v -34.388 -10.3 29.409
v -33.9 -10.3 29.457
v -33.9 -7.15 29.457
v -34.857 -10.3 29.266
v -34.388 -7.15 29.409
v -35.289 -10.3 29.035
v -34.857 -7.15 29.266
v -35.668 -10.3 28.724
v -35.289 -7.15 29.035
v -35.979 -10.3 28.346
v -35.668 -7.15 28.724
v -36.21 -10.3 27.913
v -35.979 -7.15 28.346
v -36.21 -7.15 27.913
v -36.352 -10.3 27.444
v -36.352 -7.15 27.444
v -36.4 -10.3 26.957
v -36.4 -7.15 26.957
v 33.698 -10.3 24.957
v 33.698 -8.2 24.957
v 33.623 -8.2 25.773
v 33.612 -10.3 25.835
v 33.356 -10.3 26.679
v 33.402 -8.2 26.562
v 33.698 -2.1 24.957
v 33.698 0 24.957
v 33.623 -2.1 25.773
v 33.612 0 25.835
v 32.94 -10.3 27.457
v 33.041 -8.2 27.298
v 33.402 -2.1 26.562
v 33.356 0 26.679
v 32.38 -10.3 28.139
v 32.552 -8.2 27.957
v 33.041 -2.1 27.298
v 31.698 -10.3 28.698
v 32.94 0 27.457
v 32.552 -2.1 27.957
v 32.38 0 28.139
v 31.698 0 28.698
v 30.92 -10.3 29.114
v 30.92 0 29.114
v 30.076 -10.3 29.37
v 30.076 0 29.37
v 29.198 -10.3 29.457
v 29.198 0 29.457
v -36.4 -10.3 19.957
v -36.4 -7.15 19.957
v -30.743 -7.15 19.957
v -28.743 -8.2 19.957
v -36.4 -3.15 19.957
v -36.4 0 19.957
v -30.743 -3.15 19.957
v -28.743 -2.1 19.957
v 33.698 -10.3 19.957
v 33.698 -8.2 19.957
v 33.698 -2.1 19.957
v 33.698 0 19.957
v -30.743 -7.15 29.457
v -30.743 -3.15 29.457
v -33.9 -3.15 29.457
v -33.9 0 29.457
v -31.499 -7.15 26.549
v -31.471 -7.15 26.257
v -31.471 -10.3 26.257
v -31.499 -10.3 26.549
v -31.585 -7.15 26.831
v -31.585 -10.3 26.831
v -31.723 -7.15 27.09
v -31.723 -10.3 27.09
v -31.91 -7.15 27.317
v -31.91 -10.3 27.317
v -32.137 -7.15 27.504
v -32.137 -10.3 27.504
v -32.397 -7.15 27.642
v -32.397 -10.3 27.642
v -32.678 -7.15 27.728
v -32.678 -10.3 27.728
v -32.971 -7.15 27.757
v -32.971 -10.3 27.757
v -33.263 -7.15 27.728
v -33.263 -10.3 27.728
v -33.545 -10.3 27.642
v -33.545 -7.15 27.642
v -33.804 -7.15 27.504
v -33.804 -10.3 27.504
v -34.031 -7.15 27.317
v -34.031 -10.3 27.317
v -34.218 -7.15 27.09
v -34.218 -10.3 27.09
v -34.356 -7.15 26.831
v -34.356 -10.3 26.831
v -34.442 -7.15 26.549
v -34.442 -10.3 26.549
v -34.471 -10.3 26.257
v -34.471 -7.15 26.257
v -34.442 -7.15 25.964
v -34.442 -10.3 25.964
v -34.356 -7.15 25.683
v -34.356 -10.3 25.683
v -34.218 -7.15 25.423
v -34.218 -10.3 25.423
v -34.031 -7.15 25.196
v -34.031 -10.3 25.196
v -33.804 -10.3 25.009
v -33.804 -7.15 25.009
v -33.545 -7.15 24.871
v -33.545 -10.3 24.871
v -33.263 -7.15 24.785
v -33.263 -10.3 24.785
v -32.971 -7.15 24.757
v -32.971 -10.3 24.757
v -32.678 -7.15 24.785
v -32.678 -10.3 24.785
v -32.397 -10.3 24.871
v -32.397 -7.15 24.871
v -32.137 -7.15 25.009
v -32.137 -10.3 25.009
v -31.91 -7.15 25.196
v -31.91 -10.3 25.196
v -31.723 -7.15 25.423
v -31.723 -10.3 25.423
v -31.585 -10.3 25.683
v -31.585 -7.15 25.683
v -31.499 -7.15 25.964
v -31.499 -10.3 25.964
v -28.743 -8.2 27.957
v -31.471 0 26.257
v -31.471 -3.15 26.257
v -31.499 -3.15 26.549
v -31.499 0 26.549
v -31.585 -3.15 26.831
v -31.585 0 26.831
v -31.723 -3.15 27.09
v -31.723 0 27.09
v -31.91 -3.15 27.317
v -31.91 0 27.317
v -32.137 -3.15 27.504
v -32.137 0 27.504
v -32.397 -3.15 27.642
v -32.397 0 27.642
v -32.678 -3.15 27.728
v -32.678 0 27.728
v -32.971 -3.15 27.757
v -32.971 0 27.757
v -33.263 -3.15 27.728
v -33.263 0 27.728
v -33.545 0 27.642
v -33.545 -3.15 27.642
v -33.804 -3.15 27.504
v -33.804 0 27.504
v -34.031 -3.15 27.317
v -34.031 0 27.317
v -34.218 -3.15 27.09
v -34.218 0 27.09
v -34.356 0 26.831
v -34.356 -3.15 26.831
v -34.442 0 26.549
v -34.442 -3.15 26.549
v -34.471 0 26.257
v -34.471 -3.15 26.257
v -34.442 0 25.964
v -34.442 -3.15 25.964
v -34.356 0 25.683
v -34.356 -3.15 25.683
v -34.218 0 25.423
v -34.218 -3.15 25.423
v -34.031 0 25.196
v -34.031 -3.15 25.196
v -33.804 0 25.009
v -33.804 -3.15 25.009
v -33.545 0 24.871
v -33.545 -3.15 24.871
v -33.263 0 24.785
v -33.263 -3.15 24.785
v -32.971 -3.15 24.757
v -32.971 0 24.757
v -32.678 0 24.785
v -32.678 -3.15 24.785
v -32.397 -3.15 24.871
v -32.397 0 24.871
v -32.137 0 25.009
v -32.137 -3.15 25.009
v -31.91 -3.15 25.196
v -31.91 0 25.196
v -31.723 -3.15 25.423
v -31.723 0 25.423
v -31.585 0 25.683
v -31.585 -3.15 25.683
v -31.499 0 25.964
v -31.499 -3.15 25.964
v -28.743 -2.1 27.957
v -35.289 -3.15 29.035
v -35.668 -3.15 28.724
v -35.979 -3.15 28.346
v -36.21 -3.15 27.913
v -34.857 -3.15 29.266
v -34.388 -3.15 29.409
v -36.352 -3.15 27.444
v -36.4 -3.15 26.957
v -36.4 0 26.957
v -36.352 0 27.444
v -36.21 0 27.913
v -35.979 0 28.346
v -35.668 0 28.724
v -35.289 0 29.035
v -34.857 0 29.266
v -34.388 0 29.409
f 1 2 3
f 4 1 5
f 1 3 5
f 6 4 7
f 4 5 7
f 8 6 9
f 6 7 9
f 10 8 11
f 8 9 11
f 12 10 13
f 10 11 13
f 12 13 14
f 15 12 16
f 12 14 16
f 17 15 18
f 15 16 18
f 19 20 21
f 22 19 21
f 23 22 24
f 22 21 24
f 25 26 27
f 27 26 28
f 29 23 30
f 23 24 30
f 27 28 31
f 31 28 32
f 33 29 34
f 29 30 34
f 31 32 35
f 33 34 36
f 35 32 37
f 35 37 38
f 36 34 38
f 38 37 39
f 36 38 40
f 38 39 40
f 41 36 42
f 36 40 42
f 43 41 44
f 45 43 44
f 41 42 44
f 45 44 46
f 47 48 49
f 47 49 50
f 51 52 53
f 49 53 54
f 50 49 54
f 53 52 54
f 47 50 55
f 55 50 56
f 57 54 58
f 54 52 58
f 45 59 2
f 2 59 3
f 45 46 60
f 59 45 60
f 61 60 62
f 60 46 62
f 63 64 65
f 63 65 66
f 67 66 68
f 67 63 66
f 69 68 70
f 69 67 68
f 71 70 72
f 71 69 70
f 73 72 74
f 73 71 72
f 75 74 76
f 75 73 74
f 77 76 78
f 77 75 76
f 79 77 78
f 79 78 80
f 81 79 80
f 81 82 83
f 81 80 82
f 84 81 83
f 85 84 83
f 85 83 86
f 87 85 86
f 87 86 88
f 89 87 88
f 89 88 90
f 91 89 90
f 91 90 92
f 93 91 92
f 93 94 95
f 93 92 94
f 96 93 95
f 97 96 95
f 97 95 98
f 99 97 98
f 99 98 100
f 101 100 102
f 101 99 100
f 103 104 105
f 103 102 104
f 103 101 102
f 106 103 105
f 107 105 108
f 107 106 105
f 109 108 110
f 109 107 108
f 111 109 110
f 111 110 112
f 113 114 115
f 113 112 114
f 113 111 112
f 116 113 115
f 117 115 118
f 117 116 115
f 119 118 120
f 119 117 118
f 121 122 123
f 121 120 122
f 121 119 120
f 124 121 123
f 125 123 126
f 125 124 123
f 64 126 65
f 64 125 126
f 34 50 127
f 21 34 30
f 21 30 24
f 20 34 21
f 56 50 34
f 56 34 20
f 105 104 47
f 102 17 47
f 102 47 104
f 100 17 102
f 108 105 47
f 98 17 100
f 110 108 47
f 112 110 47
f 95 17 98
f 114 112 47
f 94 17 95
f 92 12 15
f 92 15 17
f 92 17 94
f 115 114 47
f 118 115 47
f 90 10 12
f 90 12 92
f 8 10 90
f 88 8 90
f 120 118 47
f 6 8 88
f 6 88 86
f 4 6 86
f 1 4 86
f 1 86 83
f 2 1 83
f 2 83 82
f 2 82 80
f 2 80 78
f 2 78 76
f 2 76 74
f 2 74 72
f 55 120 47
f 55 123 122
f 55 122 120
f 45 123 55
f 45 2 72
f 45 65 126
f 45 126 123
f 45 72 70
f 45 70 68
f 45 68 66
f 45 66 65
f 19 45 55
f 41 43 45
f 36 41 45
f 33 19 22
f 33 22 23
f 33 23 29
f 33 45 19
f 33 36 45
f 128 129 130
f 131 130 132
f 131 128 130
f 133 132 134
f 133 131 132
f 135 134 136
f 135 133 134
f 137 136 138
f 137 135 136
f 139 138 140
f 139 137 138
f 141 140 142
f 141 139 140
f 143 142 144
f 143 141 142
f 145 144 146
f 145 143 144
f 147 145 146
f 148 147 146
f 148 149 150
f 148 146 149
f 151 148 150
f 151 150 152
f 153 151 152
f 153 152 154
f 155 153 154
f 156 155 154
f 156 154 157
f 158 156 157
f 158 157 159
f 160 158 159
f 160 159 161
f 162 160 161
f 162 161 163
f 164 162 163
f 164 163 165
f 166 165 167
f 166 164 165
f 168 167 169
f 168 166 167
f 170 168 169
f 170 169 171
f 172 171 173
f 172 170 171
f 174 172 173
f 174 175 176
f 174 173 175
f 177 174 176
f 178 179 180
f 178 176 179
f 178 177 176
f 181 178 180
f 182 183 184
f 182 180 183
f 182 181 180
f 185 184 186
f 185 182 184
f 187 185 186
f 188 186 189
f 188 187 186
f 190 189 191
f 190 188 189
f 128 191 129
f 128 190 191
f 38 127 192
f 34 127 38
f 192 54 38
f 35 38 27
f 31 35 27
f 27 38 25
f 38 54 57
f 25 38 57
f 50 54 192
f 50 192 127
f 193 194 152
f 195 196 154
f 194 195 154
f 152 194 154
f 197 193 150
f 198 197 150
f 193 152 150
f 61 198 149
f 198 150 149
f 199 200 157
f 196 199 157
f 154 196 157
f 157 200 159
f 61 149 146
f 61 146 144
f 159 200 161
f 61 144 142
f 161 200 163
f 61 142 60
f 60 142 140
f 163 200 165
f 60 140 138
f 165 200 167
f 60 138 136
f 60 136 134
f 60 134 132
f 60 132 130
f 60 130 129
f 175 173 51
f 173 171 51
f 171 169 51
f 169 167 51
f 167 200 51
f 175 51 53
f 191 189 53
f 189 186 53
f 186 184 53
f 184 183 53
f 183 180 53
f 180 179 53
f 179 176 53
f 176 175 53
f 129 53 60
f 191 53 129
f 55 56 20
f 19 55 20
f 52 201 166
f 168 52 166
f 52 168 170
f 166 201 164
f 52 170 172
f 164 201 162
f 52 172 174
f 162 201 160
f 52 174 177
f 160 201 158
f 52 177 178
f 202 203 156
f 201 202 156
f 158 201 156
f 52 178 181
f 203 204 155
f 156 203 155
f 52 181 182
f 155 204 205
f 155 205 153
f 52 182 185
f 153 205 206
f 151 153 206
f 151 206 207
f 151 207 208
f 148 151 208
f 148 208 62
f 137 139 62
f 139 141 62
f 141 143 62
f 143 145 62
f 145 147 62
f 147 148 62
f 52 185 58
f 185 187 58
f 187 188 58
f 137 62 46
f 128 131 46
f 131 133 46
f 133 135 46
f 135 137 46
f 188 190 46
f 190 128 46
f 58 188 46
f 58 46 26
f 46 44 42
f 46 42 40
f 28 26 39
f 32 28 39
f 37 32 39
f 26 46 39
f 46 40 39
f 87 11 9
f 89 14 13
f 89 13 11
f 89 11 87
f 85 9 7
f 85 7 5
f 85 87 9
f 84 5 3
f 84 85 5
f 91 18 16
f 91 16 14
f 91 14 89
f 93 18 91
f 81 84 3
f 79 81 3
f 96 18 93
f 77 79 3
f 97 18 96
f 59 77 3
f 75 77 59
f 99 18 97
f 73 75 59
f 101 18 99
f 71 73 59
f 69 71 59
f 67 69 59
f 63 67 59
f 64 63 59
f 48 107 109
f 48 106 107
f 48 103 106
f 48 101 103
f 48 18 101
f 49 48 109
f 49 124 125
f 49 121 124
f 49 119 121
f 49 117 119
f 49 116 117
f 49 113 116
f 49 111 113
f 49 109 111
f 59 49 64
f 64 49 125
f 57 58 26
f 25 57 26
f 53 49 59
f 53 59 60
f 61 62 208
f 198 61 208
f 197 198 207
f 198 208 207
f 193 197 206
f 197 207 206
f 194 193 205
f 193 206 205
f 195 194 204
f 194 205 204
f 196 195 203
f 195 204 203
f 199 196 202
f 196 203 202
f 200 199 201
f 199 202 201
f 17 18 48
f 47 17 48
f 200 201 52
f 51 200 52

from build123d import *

# Parameters (mm, degrees)
F1_DEPTH = 10.3
F2_W     = 6.2
F2_H     = 4
F3_DEPTH = 29.457661
F4_R     = 1.5
F5_DEPTH = 10.301
F6_W     = 62.441146
F6_H     = 6.1
F7_DEPTH = 8


with BuildPart() as f1:
    # F0 (on Front) → F1 (new body)
    with BuildSketch(Plane.XZ):
        with BuildLine():
            Line((29.198073, 29.456661), (-33.899927, 29.456661))
            ThreePointArc((-33.899927, 29.456661), (-35.667694, 28.724428), (-36.399927, 26.956661))
            Line((-36.399927, 26.956661), (-36.399927, 19.956661))
            Line((-36.399927, 19.956661), (33.698073, 19.956661))
            Line((33.698073, 19.956661), (33.698073, 24.956661))
            ThreePointArc((33.698073, 24.956661), (32.380053, 28.138642), (29.198073, 29.456661))
        make_face()
    extrude(amount=F1_DEPTH)

    # F2 (on Top) → F3 (cut, through all)
    with BuildSketch(Plane.XY):
        with Locations((-33.843073, -5.15)):
            Rectangle(F2_W, F2_H)
    extrude(amount=F3_DEPTH, mode=Mode.SUBTRACT)

    # F4 (on Front) → F5 (cut, through all)
    with BuildSketch(Plane.XZ):
        with Locations((-32.970642, 26.256661)):
            Circle(F4_R)
    extrude(amount=F5_DEPTH, mode=Mode.SUBTRACT)

    # F6 (on face) → F7 (cut)
    with BuildSketch(Plane(origin=(0, 0, 19.956661), x_dir=(1, 0, 0), z_dir=(0, 0, -1))):
        with Locations((2.4775, 5.15)):
            Rectangle(F6_W, F6_H)
    extrude(amount=-F7_DEPTH, mode=Mode.SUBTRACT)


solid = f1.part
